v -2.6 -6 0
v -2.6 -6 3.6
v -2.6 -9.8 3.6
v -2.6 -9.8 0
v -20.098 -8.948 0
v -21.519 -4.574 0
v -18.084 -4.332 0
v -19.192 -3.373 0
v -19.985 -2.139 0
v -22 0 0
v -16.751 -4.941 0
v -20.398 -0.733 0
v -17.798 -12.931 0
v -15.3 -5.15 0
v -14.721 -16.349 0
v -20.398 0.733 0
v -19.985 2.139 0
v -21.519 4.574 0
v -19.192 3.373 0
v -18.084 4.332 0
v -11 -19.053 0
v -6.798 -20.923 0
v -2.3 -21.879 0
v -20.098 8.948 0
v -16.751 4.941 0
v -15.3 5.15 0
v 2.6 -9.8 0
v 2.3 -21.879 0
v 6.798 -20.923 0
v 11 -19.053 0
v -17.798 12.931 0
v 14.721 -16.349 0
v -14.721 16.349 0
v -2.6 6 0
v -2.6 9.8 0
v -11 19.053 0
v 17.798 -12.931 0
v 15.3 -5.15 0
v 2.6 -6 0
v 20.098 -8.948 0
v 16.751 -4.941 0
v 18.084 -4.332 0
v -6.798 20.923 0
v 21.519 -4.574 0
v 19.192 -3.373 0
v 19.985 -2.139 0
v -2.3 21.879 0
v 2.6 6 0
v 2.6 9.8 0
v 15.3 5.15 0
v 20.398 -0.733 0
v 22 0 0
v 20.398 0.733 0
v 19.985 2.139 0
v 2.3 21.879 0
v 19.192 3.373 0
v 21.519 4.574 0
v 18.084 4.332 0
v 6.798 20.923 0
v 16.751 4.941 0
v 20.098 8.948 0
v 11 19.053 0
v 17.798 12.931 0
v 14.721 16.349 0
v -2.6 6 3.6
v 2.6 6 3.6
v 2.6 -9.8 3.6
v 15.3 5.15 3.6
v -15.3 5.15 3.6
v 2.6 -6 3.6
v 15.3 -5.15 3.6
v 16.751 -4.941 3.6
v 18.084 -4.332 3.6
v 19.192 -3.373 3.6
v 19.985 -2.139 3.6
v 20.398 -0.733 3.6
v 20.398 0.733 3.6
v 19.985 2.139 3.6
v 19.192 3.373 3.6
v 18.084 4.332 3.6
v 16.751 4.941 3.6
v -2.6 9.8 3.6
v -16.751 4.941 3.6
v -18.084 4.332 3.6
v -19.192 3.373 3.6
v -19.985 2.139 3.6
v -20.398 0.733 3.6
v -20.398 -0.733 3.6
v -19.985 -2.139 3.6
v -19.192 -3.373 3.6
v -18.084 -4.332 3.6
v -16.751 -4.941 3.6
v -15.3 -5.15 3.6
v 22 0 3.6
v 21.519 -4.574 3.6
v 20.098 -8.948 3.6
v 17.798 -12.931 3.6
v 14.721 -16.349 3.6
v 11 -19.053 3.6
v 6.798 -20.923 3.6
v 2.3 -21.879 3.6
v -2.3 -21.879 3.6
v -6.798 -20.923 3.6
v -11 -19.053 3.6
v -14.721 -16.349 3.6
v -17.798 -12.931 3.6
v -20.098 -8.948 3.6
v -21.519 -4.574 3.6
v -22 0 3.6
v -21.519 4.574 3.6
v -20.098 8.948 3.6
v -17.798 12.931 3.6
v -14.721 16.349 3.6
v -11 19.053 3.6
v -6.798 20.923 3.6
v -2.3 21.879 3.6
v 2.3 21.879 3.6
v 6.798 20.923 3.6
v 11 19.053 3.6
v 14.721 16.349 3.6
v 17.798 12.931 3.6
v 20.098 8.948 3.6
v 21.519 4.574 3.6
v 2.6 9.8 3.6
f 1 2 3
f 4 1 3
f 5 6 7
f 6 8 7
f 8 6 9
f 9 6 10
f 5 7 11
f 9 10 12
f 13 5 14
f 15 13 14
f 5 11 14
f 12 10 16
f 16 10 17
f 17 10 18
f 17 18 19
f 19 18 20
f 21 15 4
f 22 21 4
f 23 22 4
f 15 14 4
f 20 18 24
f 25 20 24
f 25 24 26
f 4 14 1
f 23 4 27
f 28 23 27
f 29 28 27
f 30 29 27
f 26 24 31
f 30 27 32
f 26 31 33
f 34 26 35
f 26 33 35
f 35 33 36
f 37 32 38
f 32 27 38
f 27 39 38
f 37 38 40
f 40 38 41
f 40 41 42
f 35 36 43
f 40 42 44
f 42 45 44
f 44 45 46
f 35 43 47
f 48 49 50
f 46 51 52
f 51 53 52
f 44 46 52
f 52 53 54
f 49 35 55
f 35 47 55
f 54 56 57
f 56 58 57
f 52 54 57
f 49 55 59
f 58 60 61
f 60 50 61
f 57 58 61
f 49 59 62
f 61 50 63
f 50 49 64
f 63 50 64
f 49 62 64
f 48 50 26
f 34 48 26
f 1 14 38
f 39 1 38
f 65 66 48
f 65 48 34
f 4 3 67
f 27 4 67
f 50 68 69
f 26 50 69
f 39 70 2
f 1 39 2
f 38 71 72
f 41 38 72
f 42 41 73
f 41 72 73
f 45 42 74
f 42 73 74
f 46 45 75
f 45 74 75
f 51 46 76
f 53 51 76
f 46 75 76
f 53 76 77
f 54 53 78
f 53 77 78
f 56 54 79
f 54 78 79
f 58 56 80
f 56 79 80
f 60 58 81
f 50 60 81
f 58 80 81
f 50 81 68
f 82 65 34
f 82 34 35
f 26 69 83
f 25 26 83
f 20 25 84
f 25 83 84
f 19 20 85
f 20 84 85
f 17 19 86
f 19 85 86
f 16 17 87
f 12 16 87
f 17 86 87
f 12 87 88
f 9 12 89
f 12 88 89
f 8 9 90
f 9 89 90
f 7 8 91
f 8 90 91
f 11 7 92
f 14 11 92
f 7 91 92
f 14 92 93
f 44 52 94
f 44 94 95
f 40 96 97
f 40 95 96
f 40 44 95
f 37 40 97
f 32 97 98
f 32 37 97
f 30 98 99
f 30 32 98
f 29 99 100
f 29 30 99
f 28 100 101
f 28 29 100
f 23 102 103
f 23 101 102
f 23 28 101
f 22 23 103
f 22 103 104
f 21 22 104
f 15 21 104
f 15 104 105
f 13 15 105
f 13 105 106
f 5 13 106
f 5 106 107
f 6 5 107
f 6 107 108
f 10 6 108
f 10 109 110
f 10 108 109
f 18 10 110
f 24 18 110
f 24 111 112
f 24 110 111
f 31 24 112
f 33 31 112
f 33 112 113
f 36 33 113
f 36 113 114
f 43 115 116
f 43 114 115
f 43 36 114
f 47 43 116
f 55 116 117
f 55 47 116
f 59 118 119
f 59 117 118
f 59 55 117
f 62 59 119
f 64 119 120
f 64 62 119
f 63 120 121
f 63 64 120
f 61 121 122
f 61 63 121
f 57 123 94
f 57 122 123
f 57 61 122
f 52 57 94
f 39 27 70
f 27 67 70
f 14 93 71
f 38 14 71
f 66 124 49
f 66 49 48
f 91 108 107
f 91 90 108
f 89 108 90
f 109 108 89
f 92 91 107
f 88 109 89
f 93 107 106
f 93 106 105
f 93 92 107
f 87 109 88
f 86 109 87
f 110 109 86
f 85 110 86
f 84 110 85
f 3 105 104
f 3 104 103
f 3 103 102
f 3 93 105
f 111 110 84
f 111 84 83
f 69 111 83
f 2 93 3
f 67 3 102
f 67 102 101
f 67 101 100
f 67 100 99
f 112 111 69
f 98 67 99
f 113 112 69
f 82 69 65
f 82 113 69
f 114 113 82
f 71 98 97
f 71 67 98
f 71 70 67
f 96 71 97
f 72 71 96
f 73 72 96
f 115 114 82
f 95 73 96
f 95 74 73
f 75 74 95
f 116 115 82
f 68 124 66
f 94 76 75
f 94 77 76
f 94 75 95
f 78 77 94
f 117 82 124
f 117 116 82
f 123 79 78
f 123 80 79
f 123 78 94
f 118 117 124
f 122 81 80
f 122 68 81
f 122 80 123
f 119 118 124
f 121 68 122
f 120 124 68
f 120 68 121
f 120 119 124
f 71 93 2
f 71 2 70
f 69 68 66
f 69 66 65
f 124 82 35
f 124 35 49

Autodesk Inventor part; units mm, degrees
ref_plane "YZ Plane" through (0, 0, 0) normal (1, 0, 0) x (0, 1, 0)
ref_plane "XZ Plane" through (0, 0, 0) normal (0, 1, 0) x (-1, 0, 0)
ref_plane "XY Plane" through (0, 0, 0) normal (0, 0, 1) x (1, 0, 0)
sketch "Sketch1" plane through (0, 0, 0) normal (0, 0, 1) x (1, 0, 0)
  circle A0 centre (0, 0) radius 22
  dimension "d0" = 44
extrude "Extrusion1" add sketch "Sketch1" along normal blind 3.6
sketch "Sketch2" plane through (0, 0, 3.6) normal (0, 0, 1) x (1, 0, 0)
  line L0 (15.3, 0) -> (-15.3, 0) construction
  line L1 (15.3, 5.15) -> (-15.3, 5.15)
  line L2 (-15.3, -5.15) -> (15.3, -5.15)
  arc A0 (15.3, -5.15) -> (15.3, 5.15) centre (15.3, 0) ccw
  arc A1 (-15.3, 5.15) -> (-15.3, -5.15) centre (-15.3, 0) ccw
  point P0 (0, 0)
  dimension "d3" = 15.3
  dimension "d4" = 10.3
extrude "Extrusion2" cut sketch "Sketch2" against normal blind 3.6
sketch "Sketch3" plane through (0, 0, 3.6) normal (0, 0, 1) x (1, 0, 0)
  line L0 (-2.6, 9.8) -> (2.6, 9.8)
  line L1 (2.6, 9.8) -> (2.6, 6)
  line L2 (2.6, 6) -> (-2.6, 6)
  line L3 (-2.6, 6) -> (-2.6, 9.8)
  line L4 (-2.6, 9.8) -> (2.6, 6) construction
  line L5 (2.6, 9.8) -> (-2.6, 6) construction
  line L6 (-30.8, 0) -> (30.8, 0) projected
  line L7 (-30.8, 0) -> (30.8, 0) projected
  line L8 (-2.6, -9.8) -> (2.6, -9.8)
  line L9 (2.6, -9.8) -> (2.6, -6)
  line L10 (2.6, -6) -> (-2.6, -6)
  line L11 (-2.6, -6) -> (-2.6, -9.8)
  line L12 (-2.6, -9.8) -> (2.6, -6) construction
  line L13 (2.6, -9.8) -> (-2.6, -6) construction
  point P0 (0, 0)
  point P1 (0, 7.9)
  point P2 (0, -7.9)
  dimension "d7" = 5.2
  dimension "d8" = 3.8
  dimension "d9" = 6
  dimension "d10" = 6
  dimension "d13" = 0
extrude "Extrusion3" cut sketch "Sketch3" against normal blind 10
properties part number "1"
